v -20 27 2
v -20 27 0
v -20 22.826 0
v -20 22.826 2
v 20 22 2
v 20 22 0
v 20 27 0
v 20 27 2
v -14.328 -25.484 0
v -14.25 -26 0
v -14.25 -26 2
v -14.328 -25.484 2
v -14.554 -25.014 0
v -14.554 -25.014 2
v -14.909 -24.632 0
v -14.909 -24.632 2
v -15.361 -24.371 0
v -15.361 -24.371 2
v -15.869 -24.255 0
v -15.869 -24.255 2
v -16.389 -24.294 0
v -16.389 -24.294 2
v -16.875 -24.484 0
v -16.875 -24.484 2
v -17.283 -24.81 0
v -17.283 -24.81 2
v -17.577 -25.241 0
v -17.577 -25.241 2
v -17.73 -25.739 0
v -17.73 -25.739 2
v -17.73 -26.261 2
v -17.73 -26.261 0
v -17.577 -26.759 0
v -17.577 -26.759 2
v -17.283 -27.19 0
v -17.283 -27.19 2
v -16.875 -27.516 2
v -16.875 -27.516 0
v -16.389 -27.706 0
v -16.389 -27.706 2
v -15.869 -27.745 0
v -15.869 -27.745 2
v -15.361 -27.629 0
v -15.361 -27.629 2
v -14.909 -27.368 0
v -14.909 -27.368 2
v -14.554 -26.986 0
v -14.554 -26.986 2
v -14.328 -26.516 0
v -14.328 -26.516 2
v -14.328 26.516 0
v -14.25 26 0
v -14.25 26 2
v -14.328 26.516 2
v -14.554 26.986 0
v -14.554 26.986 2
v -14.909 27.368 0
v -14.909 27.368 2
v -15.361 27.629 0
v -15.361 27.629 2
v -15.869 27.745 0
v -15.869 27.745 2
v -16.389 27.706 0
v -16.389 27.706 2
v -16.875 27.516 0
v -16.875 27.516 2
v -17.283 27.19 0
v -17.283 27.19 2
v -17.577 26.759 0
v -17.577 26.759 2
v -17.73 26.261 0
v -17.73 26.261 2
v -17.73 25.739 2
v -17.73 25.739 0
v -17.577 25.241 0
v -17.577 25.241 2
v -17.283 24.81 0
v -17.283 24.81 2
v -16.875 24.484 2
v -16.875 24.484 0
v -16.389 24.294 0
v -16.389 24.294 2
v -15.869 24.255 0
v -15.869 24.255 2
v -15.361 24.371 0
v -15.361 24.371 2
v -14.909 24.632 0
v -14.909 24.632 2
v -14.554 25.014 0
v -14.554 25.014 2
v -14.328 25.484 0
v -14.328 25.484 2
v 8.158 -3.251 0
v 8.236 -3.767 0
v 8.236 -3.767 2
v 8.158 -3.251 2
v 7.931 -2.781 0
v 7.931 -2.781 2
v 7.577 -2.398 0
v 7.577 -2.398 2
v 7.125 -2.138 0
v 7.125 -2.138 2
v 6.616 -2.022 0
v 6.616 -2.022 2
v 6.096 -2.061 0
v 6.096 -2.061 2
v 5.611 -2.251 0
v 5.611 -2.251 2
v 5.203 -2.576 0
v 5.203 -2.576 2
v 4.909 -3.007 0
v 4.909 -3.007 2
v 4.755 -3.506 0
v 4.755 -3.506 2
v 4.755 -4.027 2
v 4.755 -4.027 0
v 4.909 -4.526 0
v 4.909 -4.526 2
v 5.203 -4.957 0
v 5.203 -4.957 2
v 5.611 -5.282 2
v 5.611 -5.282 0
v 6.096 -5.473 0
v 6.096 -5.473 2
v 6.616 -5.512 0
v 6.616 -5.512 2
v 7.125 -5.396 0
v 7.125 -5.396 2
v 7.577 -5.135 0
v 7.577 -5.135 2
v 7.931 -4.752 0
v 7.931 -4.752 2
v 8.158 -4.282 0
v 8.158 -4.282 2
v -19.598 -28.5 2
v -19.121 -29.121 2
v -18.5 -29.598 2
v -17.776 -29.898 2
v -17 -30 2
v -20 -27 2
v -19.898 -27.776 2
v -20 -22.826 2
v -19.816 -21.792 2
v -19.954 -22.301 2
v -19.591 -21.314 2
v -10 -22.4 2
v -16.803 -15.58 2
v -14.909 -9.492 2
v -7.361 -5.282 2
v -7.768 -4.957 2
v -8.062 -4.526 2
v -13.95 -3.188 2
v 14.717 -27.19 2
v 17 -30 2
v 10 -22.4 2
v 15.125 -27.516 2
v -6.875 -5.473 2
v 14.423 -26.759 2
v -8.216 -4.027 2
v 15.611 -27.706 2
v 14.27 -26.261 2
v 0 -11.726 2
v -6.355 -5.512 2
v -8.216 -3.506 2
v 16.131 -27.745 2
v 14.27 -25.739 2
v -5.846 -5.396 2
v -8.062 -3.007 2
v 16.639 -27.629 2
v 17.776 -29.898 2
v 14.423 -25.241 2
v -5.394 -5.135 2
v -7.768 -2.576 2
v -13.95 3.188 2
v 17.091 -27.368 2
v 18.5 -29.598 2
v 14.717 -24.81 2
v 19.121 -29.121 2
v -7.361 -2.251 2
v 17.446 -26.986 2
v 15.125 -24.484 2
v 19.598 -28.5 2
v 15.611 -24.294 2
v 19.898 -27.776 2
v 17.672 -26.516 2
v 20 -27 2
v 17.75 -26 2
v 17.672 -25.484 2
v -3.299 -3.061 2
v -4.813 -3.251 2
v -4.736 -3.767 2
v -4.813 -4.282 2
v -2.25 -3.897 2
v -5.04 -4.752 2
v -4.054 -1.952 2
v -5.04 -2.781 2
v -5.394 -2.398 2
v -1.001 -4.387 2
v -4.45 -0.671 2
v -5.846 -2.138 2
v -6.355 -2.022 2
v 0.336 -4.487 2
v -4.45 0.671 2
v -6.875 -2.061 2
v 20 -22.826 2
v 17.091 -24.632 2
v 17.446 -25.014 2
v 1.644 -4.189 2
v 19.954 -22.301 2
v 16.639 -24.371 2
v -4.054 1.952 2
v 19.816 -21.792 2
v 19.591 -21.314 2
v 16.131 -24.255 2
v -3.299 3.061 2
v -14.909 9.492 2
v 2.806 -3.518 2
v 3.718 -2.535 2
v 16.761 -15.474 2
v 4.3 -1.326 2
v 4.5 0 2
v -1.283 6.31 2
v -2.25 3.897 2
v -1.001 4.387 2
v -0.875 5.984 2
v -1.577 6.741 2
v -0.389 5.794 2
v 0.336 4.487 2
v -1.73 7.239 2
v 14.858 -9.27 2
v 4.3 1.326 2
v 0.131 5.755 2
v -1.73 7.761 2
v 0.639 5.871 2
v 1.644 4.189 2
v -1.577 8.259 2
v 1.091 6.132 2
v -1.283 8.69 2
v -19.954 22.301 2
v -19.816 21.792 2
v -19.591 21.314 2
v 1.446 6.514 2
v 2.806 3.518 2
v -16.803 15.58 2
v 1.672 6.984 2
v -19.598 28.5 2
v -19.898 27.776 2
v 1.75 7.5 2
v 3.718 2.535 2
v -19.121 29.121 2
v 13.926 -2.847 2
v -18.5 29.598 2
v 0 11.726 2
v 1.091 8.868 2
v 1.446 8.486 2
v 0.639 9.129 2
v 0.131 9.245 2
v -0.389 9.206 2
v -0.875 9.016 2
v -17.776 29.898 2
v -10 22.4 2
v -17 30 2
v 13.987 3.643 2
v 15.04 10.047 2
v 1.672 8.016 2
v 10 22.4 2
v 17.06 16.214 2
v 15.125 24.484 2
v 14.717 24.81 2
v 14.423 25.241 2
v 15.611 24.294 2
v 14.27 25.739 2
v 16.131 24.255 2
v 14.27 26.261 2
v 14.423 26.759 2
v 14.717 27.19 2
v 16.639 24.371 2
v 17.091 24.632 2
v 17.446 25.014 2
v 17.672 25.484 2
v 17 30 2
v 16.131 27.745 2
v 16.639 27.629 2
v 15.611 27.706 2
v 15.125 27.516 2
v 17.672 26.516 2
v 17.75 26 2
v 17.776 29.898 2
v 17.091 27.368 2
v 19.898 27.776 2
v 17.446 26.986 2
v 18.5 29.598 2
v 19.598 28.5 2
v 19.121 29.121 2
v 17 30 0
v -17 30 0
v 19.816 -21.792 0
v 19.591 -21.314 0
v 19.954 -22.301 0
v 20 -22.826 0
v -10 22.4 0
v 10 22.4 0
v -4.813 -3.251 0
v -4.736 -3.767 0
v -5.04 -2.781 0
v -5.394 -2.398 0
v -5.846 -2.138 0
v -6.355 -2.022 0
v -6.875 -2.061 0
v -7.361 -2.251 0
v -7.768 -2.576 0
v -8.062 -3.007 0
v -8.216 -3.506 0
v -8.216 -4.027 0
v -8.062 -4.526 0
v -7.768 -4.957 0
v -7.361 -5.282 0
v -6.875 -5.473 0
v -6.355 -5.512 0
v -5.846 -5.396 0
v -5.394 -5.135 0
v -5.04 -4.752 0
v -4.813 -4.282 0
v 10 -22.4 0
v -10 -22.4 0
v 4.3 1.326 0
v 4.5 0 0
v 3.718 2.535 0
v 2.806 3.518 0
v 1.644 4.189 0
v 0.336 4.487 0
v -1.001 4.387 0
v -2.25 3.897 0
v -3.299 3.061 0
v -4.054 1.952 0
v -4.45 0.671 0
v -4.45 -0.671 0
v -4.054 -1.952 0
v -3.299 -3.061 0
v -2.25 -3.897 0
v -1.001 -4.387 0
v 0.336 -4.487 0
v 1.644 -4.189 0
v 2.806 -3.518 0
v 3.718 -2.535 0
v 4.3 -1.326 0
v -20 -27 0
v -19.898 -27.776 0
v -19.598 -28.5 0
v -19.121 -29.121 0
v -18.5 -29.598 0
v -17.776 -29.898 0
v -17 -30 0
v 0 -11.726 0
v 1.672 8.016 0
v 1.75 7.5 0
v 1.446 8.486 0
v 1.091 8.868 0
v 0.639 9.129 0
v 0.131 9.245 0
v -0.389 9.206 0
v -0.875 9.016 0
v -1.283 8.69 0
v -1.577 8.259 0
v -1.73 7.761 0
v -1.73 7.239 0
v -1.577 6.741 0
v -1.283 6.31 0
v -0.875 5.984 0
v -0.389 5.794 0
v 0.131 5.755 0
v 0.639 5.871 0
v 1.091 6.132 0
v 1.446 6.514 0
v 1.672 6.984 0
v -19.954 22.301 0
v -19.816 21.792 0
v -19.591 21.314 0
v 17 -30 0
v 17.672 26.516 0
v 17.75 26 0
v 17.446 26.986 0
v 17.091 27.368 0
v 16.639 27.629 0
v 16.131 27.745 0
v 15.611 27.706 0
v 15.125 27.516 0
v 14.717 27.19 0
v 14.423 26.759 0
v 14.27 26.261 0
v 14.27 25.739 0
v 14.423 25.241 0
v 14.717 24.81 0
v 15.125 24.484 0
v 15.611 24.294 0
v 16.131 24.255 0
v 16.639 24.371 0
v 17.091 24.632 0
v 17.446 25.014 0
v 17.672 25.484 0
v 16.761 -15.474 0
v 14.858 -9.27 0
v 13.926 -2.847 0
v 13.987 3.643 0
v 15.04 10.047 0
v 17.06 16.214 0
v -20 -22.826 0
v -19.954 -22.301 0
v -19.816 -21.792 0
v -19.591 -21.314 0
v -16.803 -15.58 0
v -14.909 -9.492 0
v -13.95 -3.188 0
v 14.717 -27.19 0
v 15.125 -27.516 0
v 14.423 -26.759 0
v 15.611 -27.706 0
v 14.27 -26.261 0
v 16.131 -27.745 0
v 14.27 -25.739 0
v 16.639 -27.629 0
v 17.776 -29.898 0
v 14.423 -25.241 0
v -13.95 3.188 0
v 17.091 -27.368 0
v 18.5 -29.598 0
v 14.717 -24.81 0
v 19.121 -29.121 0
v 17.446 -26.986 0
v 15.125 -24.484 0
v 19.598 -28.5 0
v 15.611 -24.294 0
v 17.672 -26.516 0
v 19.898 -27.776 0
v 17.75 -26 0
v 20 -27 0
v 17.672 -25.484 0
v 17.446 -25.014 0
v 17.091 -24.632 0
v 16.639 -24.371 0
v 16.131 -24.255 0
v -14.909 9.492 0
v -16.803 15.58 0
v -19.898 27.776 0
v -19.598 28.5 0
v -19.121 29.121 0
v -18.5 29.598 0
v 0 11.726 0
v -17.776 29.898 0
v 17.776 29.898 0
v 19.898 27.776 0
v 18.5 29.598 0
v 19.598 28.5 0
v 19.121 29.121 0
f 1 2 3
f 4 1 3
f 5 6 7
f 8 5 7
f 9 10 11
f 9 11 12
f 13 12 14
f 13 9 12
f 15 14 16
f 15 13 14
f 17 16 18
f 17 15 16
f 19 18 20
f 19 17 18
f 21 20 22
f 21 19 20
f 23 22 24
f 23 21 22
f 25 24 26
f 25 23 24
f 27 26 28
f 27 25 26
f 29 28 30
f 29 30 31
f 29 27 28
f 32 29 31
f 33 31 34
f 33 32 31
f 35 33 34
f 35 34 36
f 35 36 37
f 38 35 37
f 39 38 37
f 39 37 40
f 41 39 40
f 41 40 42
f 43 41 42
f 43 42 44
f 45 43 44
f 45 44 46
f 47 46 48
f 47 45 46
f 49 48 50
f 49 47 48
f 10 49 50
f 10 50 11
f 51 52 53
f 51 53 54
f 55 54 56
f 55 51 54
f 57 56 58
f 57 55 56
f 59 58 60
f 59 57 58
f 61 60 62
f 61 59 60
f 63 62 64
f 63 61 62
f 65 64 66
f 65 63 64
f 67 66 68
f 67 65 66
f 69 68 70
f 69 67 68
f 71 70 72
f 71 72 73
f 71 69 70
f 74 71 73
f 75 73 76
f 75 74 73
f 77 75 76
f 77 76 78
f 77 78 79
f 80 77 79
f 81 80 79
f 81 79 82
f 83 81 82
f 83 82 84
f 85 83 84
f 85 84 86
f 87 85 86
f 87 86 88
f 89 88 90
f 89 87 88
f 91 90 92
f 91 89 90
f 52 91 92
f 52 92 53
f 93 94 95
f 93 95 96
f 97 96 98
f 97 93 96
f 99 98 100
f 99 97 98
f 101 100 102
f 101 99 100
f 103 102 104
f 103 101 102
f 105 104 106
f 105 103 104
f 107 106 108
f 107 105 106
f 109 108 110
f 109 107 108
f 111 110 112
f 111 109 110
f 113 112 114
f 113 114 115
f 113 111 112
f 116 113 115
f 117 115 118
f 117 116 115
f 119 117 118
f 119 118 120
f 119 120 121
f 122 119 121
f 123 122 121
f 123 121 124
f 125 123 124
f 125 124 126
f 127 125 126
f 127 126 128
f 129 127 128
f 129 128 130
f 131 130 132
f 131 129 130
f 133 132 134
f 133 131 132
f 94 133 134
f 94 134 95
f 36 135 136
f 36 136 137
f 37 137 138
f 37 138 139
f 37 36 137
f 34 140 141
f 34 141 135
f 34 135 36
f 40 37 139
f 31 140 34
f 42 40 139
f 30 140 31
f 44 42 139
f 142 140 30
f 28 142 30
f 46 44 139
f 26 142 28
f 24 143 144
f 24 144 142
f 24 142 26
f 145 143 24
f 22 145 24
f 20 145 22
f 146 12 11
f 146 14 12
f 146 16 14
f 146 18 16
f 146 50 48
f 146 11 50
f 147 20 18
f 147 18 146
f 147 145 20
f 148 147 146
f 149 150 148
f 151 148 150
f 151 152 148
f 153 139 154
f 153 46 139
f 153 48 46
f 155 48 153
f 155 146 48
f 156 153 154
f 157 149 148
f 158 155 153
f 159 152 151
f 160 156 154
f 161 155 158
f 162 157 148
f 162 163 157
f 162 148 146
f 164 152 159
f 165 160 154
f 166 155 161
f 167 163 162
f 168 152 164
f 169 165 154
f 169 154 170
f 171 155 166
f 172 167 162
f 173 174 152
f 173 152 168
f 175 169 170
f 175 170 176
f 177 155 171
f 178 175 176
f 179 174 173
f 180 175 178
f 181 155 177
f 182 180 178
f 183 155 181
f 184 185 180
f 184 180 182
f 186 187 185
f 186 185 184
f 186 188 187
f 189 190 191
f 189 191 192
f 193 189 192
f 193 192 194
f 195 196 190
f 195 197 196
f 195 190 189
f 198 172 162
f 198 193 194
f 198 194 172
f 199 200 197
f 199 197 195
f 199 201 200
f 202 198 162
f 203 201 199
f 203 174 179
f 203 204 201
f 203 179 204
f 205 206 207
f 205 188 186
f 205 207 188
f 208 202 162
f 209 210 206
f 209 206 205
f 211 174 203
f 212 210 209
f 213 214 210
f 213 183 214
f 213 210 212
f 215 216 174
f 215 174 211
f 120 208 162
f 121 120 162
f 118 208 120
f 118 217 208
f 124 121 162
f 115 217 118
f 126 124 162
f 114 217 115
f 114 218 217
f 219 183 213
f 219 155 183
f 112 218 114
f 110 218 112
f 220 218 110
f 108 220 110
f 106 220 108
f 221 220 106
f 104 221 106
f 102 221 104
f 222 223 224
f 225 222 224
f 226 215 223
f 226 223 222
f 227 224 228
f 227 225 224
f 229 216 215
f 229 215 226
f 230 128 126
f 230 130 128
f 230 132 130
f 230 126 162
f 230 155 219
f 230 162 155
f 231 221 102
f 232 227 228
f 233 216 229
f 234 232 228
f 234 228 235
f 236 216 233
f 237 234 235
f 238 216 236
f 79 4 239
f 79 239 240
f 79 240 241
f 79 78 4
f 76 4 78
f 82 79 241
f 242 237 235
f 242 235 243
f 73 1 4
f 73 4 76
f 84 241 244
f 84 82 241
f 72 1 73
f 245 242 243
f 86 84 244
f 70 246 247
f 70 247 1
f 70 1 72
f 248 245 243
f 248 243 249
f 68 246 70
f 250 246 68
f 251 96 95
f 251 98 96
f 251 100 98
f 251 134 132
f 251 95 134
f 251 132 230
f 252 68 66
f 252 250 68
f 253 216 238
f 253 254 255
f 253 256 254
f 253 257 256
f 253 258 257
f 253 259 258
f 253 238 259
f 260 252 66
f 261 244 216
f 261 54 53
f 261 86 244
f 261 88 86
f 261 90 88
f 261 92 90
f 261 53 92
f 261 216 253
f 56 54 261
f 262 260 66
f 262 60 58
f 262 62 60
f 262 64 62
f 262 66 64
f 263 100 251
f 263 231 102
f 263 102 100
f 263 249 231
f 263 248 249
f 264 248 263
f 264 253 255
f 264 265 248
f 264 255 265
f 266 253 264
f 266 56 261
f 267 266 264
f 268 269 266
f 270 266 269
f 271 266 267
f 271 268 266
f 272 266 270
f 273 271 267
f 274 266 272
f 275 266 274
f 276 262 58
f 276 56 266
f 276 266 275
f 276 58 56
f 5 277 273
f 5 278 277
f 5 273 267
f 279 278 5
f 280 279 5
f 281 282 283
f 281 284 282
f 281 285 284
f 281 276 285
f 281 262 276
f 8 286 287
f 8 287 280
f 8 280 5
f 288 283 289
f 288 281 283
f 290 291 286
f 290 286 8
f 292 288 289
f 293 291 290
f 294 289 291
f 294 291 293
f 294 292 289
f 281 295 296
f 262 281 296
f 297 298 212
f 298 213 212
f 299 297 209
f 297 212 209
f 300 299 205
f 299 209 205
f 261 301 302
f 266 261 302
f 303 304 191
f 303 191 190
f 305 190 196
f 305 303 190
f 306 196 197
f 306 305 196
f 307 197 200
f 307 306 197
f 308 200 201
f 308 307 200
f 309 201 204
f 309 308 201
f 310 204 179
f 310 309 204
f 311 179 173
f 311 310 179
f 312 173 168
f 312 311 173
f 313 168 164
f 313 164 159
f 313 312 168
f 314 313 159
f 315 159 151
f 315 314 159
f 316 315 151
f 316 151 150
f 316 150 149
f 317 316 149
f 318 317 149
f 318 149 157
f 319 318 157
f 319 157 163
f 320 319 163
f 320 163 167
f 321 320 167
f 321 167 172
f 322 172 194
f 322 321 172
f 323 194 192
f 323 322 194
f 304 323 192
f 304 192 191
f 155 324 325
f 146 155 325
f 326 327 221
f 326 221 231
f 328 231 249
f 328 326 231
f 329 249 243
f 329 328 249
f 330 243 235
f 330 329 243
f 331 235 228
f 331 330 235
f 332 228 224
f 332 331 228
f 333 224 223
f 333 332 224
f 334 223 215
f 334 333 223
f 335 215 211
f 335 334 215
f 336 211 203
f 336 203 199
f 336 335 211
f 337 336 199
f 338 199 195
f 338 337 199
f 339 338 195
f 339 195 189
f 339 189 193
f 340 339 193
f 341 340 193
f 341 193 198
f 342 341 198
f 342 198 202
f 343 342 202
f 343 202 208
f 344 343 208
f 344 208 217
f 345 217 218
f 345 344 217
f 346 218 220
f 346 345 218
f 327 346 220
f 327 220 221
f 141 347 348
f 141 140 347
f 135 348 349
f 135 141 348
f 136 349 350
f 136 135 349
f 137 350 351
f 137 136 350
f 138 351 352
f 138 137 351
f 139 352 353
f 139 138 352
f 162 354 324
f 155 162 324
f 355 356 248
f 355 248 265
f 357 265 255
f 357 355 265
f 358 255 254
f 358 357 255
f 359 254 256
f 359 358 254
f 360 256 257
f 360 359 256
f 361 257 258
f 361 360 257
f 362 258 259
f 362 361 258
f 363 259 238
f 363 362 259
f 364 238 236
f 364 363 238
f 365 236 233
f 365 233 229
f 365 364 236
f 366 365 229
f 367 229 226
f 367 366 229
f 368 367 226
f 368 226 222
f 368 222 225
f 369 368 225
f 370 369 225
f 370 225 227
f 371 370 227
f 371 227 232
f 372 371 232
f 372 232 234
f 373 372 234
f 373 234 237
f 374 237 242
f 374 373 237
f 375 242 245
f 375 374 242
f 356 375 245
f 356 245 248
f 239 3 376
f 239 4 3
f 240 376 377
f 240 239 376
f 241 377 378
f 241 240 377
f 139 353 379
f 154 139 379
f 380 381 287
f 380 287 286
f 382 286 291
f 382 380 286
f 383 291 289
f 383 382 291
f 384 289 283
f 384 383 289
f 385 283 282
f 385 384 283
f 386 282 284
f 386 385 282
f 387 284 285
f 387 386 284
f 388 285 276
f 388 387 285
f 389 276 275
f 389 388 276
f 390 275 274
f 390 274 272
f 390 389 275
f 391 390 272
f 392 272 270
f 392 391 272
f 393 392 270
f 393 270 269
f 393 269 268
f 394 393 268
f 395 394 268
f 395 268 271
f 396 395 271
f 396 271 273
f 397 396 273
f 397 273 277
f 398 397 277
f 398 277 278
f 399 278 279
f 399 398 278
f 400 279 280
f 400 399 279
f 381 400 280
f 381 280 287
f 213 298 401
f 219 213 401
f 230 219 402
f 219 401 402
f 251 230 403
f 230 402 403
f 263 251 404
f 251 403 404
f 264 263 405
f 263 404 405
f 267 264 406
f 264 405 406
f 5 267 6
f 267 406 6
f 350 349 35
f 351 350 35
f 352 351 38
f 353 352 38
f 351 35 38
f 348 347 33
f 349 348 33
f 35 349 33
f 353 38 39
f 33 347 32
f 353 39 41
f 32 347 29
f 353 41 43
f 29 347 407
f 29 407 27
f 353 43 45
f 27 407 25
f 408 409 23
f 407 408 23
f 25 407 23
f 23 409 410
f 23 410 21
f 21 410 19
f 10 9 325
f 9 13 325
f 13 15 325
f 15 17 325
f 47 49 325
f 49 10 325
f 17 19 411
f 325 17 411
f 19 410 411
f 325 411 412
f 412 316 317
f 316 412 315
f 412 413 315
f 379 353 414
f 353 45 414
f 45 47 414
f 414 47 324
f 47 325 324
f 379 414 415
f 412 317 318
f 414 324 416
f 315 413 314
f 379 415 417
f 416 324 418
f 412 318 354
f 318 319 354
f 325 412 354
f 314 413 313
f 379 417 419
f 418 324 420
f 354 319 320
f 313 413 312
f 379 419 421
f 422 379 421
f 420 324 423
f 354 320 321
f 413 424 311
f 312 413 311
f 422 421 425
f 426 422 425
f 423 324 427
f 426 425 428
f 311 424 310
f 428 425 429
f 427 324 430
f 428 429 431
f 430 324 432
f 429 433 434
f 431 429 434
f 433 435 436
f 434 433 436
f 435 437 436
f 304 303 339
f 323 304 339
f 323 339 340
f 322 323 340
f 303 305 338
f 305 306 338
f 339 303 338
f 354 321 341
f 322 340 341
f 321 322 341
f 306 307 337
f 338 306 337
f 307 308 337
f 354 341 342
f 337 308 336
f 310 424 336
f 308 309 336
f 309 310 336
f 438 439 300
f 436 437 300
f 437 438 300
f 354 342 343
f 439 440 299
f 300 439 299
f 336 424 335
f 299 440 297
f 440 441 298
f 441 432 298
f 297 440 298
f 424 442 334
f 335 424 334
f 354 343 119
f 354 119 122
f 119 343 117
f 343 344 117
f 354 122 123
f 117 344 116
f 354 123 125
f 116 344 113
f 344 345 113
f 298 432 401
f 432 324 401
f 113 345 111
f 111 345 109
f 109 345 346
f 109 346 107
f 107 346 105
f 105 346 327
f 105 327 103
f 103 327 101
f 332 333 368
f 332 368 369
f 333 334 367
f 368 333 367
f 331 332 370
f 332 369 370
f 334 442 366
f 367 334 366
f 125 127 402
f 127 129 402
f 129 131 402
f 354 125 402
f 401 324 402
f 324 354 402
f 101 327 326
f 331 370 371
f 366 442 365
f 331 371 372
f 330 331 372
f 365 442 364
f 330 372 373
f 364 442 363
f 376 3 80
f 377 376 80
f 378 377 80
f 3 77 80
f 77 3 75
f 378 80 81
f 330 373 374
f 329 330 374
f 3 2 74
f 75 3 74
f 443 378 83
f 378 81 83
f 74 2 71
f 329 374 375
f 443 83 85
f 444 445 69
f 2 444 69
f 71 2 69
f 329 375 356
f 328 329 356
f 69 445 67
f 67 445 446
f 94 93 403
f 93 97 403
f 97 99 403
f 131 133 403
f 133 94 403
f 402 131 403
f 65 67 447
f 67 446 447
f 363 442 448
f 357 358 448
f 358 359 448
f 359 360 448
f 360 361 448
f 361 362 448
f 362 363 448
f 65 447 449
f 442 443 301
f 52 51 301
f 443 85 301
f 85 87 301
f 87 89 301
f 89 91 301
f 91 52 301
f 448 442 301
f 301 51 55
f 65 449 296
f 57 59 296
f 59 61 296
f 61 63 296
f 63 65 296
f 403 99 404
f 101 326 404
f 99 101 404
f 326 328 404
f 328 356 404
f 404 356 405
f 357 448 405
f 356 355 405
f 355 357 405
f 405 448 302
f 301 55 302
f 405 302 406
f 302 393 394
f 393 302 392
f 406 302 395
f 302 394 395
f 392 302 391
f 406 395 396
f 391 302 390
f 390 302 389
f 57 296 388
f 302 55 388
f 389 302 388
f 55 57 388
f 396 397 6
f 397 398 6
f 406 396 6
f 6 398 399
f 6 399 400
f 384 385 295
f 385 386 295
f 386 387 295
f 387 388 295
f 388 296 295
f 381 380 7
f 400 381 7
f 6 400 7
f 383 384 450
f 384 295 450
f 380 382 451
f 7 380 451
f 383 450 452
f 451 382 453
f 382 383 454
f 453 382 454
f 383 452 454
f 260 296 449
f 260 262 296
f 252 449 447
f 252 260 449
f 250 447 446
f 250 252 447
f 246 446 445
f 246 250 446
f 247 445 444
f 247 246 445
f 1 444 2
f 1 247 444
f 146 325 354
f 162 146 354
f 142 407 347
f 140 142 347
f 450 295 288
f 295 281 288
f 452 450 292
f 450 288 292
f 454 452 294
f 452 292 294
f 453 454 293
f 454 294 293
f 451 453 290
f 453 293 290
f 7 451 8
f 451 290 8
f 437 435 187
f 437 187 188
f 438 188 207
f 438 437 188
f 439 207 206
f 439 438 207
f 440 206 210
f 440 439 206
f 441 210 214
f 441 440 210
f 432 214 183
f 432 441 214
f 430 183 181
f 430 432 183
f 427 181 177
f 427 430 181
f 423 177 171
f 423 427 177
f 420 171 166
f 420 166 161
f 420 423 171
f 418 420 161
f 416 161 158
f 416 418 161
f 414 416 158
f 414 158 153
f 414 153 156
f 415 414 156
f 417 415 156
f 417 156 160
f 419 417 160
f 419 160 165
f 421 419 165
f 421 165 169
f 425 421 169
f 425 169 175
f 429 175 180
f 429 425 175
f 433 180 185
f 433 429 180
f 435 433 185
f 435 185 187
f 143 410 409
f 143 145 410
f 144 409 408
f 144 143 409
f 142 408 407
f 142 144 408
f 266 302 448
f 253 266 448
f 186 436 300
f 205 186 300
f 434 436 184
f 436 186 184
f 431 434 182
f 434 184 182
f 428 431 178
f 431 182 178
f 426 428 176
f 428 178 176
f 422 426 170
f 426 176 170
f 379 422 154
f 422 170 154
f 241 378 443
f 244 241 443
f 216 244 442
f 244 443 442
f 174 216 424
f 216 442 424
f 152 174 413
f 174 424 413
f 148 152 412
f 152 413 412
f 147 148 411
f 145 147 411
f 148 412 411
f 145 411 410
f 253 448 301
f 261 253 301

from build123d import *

# Parameters (mm, degrees)
F0_R     = 1.75
F0_R_2   = 4.5
F1_DEPTH = 2
F2_R     = 3


with BuildPart() as f1:
    # F0 (on Top) → F1 (new body)
    with BuildSketch(Plane.XY):
        with BuildLine():
            Line((20, 30), (-20, 30))
            Line((-20, 30), (-20, 22))
            ThreePointArc((-20, 22), (-13.8300253787, 0), (-20, -22))
            Line((-20, -22), (-20, -30))
            Line((-20, -30), (20, -30))
            Line((20, -30), (20, -22))
            ThreePointArc((20, -22), (13.8300253787, 0), (20, 22))
            Line((20, 22), (20, 30))
        make_face()
        with Locations((-16, -26)):
            Circle(F0_R, mode=Mode.SUBTRACT)
        with Locations((-6.4855394704, -3.7666666667)):
            Circle(F0_R, mode=Mode.SUBTRACT)
        Polygon((10, -22.4003139883), (0, -22.4003139883), (-10, -22.4003139883), (0, -11.7255505174), align=None, mode=Mode.SUBTRACT)
        with Locations((16, -26)):
            Circle(F0_R, mode=Mode.SUBTRACT)
        with Locations((6.4855394704, -3.7666666667)):
            Circle(F0_R, mode=Mode.SUBTRACT)
        with Locations((-16, 26)):
            Circle(F0_R, mode=Mode.SUBTRACT)
        Circle(F0_R_2, mode=Mode.SUBTRACT)
        with Locations((0, 7.5)):
            Circle(F0_R, mode=Mode.SUBTRACT)
        Polygon((0, 22.4003139883), (10, 22.4003139883), (0, 11.7255505174), (-10, 22.4003139883), align=None, mode=Mode.SUBTRACT)
        with Locations((16, 26)):
            Circle(F0_R, mode=Mode.SUBTRACT)
    extrude(amount=F1_DEPTH)

    # F2
    f2_edges = [f1.edges().sort_by_distance(p)[0] for p in [
        (-20, 30, 1),
        (-20, -30, 1),
        (20, -30, 1),
        (20, 30, 1),
        (20, -22, 1),
        (-20, -22, 1),
        (-20, 22, 1),
    ]]
    fillet(f2_edges, radius=F2_R)


solid = f1.part
